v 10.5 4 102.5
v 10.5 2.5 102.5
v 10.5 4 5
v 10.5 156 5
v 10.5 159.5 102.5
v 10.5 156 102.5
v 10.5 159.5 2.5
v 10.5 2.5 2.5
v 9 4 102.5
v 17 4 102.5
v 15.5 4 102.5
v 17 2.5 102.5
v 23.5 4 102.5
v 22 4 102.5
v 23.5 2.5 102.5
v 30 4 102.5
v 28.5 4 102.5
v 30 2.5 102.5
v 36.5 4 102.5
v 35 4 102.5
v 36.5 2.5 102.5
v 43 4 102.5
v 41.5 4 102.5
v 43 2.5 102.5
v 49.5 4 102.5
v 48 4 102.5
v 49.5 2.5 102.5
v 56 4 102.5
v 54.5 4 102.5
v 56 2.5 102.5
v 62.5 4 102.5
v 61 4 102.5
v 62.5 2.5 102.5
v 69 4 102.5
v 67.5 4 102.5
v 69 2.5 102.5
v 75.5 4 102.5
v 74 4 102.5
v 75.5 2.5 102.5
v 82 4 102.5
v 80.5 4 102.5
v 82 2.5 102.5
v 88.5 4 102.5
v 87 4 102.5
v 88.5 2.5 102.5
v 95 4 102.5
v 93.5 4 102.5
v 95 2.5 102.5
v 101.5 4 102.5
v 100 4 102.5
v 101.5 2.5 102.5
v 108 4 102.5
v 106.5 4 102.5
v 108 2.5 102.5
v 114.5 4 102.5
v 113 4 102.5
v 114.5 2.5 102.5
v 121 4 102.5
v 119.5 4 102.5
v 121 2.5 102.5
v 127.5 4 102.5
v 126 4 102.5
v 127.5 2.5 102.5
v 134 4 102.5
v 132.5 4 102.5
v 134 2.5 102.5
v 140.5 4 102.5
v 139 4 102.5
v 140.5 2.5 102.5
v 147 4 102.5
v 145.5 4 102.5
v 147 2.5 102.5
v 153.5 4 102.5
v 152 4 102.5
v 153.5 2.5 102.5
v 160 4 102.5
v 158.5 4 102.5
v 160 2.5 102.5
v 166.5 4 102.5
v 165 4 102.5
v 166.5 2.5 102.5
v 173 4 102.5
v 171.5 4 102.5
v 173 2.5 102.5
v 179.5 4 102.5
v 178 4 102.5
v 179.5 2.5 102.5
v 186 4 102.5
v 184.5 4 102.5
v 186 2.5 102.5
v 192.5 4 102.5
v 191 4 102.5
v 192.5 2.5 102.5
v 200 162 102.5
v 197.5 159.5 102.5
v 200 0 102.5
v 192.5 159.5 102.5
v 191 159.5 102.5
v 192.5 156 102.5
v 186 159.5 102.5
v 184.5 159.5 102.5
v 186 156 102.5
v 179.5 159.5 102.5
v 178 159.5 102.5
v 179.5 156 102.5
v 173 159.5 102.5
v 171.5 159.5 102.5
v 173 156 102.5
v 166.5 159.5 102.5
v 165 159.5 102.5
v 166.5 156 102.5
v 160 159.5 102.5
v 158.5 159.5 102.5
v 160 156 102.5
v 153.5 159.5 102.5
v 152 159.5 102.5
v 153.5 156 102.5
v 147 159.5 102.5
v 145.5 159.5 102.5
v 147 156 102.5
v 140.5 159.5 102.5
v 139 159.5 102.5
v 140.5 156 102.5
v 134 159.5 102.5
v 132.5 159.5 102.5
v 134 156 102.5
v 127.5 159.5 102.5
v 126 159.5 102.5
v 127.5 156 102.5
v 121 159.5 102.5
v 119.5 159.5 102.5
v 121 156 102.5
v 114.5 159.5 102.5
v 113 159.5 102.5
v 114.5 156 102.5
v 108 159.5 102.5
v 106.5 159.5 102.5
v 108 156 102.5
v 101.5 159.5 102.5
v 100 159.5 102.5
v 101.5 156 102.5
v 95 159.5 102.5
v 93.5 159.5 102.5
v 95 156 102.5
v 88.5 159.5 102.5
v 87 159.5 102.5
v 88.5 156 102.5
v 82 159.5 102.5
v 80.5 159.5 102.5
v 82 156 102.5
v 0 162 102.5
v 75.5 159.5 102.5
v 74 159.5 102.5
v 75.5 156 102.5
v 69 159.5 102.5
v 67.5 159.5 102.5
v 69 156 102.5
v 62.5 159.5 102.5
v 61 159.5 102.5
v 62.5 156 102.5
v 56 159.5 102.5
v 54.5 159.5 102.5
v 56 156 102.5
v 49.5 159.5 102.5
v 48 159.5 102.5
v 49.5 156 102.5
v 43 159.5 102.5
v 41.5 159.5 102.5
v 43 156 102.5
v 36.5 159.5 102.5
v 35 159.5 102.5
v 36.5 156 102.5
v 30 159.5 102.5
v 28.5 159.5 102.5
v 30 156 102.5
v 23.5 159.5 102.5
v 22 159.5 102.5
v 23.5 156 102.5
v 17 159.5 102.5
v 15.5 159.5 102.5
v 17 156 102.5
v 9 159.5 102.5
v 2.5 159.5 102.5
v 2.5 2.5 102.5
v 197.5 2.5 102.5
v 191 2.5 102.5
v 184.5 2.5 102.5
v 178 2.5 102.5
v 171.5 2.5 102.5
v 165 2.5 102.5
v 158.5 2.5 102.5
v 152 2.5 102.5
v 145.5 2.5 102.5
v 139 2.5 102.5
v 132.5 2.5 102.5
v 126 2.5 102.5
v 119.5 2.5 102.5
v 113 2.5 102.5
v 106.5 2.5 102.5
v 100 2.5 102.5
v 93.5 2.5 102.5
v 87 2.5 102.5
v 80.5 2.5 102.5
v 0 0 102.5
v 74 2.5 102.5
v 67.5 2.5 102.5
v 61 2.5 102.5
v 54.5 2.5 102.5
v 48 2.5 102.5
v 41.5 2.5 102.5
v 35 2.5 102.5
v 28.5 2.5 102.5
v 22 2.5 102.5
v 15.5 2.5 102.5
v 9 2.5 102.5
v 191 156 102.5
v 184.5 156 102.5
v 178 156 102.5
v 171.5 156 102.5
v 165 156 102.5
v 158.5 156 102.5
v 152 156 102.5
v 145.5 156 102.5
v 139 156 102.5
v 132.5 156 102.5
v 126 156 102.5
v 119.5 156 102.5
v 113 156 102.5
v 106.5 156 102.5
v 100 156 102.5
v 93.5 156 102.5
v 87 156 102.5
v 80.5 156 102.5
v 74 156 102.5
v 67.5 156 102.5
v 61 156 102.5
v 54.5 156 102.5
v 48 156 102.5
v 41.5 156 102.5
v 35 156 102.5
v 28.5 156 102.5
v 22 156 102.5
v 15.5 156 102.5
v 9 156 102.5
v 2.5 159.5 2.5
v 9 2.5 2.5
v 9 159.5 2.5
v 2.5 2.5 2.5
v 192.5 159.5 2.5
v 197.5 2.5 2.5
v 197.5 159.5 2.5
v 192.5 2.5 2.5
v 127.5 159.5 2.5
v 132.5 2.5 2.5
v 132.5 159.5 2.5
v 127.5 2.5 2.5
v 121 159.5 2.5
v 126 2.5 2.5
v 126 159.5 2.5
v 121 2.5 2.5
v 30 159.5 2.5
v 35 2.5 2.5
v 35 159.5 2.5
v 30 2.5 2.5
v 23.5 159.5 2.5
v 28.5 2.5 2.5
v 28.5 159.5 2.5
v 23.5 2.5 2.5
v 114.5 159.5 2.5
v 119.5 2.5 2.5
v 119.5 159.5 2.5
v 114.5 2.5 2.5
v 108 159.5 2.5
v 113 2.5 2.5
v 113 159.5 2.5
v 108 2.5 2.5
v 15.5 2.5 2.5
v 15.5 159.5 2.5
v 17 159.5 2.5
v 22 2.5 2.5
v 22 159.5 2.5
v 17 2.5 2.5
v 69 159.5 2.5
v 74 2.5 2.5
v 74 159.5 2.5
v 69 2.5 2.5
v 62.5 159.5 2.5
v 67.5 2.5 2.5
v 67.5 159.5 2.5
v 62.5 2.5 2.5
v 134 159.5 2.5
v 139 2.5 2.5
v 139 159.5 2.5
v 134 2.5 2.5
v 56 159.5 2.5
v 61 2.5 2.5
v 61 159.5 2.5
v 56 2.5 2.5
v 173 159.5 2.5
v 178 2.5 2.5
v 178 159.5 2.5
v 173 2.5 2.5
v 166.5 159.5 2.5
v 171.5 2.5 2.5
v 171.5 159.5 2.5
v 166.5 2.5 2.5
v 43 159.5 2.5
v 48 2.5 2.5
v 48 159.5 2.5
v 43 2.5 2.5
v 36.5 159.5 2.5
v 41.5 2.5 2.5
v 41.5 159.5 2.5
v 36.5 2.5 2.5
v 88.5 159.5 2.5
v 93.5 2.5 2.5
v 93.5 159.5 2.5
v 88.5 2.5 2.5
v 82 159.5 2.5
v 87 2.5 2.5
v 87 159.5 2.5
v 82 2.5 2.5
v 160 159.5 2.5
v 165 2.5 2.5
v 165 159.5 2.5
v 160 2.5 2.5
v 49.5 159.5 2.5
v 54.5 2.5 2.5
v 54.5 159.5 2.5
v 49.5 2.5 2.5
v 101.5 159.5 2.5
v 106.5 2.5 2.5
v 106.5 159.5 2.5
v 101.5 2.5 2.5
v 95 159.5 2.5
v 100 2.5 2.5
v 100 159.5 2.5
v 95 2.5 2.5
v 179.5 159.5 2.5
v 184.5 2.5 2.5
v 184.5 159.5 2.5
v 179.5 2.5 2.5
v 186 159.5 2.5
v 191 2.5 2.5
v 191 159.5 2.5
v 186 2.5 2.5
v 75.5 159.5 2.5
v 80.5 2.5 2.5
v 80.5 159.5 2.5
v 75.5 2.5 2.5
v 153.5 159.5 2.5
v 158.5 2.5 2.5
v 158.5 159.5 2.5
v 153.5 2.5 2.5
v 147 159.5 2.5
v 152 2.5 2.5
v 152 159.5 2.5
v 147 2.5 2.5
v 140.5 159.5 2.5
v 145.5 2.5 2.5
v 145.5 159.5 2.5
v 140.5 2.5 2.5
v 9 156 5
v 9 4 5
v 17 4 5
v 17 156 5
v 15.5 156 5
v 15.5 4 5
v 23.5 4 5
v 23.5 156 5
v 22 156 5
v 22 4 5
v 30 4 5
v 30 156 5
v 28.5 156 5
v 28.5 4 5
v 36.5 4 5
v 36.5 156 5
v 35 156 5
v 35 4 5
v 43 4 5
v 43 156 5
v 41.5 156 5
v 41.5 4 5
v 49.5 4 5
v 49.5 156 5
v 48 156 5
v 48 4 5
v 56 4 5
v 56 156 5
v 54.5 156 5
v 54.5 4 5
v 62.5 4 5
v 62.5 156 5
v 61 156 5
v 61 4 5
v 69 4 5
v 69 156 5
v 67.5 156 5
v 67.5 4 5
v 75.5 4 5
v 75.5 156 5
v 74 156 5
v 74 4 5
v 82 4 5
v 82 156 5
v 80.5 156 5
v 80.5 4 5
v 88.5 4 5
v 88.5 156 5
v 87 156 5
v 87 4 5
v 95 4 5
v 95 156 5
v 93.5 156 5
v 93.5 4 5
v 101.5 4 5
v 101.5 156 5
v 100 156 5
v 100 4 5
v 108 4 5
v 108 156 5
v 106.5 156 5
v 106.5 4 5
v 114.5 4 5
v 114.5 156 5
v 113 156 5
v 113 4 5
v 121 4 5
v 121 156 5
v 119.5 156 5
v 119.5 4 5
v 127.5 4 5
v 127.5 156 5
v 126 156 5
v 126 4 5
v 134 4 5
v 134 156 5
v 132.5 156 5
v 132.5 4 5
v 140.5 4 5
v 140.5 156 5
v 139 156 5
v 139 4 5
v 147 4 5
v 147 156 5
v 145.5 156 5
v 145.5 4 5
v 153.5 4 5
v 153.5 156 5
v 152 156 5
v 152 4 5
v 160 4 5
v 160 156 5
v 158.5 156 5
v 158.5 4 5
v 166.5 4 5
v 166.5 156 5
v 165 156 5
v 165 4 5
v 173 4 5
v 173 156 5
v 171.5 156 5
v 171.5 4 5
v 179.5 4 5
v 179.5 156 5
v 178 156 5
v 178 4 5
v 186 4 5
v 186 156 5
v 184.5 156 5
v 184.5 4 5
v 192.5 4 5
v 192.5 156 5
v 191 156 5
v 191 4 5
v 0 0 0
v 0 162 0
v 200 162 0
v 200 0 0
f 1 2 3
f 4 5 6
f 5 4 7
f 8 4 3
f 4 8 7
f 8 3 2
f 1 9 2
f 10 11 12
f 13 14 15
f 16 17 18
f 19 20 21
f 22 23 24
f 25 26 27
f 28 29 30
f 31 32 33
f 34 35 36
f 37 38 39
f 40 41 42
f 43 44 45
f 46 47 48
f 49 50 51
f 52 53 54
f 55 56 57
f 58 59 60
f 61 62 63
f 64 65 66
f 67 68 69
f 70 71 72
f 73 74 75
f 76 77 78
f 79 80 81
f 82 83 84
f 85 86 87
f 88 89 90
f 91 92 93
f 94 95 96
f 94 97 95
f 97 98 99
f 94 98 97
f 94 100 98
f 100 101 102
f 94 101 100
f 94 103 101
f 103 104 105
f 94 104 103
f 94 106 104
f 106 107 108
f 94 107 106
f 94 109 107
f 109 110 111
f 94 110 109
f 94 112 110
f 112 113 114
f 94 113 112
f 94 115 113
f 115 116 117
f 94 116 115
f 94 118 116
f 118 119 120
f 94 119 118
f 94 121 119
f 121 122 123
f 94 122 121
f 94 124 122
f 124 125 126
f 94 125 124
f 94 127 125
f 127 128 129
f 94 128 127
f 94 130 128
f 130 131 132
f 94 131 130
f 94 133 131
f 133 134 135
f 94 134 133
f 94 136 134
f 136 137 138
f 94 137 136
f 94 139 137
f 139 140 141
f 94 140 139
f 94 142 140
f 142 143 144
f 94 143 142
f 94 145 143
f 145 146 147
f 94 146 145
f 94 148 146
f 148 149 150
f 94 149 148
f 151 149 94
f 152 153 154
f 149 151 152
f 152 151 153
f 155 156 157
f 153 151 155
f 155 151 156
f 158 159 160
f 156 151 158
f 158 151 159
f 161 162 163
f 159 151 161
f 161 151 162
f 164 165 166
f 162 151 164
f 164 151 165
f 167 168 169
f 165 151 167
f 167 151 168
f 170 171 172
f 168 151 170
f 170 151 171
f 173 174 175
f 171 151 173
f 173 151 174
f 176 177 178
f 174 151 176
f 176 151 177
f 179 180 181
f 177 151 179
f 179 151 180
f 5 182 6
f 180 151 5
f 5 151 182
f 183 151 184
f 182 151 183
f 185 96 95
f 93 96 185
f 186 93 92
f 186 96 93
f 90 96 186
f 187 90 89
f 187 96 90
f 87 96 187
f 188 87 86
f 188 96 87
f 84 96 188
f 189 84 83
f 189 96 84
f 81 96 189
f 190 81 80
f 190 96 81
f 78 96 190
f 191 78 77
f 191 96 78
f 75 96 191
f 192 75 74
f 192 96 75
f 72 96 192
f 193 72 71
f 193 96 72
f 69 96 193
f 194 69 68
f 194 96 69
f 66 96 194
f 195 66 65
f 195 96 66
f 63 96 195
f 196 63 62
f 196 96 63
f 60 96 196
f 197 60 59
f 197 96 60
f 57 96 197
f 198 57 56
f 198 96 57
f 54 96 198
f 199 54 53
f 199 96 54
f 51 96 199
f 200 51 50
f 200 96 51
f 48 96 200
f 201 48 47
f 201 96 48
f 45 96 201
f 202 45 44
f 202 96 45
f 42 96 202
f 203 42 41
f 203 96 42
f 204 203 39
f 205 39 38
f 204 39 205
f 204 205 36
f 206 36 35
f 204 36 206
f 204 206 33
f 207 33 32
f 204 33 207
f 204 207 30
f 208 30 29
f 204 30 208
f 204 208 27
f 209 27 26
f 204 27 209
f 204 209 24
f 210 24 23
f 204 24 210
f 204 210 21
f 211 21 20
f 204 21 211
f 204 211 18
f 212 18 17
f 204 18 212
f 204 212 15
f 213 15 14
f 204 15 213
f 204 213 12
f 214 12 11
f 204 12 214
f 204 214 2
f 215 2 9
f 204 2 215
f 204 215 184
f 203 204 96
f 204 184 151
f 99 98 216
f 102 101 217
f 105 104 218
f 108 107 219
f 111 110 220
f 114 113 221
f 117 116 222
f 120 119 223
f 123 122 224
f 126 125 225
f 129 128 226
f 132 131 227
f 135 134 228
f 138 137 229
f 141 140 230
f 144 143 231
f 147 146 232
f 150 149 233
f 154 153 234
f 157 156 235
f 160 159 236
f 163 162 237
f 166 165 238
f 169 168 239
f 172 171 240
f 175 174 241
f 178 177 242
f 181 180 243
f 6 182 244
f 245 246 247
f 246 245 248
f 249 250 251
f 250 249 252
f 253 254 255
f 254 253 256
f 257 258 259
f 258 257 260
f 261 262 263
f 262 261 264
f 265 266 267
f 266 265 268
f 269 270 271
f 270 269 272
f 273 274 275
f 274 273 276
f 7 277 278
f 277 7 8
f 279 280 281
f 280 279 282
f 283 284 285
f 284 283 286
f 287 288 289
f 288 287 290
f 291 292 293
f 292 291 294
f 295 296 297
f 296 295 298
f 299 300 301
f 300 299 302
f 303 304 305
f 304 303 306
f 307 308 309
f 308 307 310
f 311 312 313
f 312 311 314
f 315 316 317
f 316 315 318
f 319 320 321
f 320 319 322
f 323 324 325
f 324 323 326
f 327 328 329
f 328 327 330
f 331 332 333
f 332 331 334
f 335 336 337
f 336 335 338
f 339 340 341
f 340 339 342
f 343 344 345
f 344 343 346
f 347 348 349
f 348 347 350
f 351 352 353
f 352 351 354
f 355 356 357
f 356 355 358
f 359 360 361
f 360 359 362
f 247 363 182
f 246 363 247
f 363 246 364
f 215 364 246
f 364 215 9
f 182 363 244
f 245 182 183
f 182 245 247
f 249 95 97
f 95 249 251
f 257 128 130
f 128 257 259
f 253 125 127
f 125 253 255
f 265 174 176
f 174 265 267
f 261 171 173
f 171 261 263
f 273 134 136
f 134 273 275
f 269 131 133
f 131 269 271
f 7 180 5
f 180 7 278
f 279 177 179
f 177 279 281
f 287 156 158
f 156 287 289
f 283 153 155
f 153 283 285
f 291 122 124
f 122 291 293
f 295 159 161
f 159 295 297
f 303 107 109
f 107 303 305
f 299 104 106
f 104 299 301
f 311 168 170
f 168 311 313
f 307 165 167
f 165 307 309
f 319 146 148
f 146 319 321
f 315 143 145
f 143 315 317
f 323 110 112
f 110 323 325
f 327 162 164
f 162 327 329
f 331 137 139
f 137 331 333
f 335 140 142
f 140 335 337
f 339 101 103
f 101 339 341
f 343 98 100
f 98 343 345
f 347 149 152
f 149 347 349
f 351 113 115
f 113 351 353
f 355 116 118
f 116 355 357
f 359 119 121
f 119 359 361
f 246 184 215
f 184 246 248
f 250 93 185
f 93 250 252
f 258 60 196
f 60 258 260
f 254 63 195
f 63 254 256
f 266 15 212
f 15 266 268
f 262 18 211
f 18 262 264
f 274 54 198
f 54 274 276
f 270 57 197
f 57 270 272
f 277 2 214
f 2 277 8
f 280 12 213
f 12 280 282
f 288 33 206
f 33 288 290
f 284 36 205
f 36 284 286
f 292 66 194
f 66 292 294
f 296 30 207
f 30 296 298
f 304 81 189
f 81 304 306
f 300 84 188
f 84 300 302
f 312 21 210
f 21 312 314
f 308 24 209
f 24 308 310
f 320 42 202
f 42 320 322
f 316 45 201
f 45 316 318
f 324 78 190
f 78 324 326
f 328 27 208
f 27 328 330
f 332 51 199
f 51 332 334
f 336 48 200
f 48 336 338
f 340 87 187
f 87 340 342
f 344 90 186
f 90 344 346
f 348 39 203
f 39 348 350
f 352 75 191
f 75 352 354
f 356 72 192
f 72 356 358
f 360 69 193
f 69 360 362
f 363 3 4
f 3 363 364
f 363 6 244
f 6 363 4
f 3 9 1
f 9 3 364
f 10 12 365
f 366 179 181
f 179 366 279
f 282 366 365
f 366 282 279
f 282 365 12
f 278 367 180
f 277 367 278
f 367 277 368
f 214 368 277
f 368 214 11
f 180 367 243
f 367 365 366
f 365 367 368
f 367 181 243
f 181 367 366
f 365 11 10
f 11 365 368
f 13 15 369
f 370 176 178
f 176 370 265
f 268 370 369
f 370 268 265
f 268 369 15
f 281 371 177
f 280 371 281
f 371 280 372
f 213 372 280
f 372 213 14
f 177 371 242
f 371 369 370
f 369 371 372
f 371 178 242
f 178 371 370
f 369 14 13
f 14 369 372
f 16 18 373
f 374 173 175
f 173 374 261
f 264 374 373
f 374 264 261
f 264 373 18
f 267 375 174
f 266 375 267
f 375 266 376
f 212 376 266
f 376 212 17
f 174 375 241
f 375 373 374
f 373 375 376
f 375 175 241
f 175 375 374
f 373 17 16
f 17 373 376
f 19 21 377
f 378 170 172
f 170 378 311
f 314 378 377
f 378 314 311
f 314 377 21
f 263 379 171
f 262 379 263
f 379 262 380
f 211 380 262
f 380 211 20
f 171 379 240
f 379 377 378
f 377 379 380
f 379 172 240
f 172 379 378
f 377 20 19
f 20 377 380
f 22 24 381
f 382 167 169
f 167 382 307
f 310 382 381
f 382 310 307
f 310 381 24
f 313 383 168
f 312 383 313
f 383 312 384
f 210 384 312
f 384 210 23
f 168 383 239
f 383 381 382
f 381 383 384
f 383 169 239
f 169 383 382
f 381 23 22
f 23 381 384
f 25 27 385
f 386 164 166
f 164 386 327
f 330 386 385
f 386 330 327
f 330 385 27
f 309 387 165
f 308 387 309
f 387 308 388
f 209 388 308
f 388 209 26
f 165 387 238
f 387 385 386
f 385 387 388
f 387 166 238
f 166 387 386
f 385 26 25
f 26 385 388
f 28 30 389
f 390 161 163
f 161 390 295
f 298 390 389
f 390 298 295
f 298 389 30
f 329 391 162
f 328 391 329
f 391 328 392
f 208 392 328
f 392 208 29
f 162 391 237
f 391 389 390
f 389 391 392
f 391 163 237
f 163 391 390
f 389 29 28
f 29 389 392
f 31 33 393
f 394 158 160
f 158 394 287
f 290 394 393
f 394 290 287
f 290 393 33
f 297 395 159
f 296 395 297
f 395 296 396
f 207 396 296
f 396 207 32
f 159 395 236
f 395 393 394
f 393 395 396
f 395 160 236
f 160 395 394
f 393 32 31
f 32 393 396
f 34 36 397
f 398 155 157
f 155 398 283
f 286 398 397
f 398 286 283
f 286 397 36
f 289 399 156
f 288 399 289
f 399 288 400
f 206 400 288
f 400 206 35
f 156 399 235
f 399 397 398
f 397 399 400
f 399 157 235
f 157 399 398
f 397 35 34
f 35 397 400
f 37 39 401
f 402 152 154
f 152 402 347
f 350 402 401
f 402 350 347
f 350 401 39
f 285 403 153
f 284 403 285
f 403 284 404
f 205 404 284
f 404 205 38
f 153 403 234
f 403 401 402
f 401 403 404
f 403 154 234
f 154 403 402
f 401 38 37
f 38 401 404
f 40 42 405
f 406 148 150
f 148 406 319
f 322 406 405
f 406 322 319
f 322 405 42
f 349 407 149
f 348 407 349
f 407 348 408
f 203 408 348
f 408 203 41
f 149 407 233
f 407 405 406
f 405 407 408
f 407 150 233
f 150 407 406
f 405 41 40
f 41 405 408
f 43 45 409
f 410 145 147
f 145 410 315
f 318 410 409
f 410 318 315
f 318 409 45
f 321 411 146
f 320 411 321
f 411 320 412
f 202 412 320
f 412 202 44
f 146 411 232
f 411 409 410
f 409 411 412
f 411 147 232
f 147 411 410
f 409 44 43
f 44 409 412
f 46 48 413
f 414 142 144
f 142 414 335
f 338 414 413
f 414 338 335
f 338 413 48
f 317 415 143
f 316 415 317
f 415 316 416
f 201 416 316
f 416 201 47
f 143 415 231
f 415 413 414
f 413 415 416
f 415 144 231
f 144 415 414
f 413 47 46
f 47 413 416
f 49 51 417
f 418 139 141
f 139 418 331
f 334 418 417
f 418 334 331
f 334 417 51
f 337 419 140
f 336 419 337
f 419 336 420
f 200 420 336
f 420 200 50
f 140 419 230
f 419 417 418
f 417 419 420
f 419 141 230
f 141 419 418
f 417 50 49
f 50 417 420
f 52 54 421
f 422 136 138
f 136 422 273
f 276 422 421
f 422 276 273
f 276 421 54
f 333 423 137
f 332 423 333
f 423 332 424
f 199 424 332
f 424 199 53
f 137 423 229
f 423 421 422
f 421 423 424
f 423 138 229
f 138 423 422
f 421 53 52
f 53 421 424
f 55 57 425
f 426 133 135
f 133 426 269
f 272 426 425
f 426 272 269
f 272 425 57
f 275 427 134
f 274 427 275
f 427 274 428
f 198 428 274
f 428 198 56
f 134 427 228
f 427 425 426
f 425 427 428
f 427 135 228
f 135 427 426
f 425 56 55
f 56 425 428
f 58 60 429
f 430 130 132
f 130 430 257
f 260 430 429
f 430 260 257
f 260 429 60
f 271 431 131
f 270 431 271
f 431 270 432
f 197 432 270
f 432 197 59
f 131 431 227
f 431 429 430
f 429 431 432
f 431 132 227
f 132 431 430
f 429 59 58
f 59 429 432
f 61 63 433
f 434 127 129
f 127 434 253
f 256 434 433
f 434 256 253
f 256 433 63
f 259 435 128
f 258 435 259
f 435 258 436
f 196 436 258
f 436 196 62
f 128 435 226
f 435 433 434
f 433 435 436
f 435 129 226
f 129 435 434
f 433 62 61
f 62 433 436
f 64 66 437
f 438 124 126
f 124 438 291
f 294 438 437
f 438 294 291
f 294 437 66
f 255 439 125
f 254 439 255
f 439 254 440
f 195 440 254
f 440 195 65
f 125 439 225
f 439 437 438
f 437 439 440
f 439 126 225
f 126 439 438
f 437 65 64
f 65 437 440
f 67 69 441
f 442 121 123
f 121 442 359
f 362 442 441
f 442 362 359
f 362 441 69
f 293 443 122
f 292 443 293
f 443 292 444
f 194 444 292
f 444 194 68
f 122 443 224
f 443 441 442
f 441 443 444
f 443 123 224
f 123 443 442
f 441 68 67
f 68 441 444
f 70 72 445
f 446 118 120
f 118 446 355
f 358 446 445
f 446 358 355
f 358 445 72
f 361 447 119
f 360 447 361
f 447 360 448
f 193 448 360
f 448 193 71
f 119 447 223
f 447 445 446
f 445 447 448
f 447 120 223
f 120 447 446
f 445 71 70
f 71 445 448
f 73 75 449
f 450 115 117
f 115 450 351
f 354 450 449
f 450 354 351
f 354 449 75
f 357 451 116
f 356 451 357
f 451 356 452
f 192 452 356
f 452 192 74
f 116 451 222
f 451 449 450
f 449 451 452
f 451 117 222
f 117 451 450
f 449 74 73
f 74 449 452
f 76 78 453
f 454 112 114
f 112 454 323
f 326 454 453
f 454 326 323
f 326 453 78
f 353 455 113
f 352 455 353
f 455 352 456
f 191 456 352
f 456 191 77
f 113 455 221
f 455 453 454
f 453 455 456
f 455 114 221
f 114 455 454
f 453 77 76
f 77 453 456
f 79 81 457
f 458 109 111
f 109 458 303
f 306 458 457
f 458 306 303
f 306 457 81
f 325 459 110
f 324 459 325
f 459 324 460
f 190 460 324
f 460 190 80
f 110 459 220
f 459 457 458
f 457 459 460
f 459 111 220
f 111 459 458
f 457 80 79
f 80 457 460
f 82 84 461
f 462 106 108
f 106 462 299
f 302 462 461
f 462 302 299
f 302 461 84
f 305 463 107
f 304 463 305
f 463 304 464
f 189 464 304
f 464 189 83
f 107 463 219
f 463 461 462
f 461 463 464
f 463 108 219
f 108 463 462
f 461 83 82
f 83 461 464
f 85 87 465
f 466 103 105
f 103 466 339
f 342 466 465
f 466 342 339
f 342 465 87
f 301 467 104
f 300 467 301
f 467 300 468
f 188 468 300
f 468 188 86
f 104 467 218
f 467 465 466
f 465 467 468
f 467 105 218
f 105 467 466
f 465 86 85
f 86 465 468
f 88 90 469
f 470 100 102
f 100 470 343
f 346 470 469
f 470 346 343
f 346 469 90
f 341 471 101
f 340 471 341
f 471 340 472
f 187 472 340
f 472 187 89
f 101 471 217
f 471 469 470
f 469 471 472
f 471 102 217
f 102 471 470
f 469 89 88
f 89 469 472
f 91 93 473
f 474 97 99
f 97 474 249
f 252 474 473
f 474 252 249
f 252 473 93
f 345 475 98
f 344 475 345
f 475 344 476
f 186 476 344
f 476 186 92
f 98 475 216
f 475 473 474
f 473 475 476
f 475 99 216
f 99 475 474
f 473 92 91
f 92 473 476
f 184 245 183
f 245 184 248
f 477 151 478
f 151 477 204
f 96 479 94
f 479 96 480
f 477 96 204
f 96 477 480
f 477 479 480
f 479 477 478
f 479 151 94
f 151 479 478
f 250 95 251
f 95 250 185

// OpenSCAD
side_height=100;
wall_thickness=2.5;
grater_width=157;
bottom_length=200;

shelf_width=5;
shelf_thickness=1.5;

shelf_interval=shelf_width + shelf_thickness;

module end()
{
    cube([wall_thickness, grater_width, side_height]);
}

module shelf()
{
    color("#fefefe")
    difference() {
        cube([shelf_thickness, grater_width, side_height]);
        translate([-1, shelf_thickness, wall_thickness]) cube([shelf_width, grater_width - shelf_width, side_height]);
    };
}

module side()
{
    cube([bottom_length, wall_thickness, side_height]);
}

union()
{
  translate([0, wall_thickness, wall_thickness]) end();
  translate([0, 0, wall_thickness]) side();
  cube([bottom_length, grater_width + 2*wall_thickness, wall_thickness]);
  translate([bottom_length - wall_thickness, wall_thickness, wall_thickness]) end();
  translate([0, grater_width + wall_thickness, wall_thickness]) side();
    
   for (offset = [shelf_interval + wall_thickness: shelf_interval: bottom_length - shelf_interval])
   {
        translate([offset, wall_thickness, wall_thickness]) shelf();
   }
}
